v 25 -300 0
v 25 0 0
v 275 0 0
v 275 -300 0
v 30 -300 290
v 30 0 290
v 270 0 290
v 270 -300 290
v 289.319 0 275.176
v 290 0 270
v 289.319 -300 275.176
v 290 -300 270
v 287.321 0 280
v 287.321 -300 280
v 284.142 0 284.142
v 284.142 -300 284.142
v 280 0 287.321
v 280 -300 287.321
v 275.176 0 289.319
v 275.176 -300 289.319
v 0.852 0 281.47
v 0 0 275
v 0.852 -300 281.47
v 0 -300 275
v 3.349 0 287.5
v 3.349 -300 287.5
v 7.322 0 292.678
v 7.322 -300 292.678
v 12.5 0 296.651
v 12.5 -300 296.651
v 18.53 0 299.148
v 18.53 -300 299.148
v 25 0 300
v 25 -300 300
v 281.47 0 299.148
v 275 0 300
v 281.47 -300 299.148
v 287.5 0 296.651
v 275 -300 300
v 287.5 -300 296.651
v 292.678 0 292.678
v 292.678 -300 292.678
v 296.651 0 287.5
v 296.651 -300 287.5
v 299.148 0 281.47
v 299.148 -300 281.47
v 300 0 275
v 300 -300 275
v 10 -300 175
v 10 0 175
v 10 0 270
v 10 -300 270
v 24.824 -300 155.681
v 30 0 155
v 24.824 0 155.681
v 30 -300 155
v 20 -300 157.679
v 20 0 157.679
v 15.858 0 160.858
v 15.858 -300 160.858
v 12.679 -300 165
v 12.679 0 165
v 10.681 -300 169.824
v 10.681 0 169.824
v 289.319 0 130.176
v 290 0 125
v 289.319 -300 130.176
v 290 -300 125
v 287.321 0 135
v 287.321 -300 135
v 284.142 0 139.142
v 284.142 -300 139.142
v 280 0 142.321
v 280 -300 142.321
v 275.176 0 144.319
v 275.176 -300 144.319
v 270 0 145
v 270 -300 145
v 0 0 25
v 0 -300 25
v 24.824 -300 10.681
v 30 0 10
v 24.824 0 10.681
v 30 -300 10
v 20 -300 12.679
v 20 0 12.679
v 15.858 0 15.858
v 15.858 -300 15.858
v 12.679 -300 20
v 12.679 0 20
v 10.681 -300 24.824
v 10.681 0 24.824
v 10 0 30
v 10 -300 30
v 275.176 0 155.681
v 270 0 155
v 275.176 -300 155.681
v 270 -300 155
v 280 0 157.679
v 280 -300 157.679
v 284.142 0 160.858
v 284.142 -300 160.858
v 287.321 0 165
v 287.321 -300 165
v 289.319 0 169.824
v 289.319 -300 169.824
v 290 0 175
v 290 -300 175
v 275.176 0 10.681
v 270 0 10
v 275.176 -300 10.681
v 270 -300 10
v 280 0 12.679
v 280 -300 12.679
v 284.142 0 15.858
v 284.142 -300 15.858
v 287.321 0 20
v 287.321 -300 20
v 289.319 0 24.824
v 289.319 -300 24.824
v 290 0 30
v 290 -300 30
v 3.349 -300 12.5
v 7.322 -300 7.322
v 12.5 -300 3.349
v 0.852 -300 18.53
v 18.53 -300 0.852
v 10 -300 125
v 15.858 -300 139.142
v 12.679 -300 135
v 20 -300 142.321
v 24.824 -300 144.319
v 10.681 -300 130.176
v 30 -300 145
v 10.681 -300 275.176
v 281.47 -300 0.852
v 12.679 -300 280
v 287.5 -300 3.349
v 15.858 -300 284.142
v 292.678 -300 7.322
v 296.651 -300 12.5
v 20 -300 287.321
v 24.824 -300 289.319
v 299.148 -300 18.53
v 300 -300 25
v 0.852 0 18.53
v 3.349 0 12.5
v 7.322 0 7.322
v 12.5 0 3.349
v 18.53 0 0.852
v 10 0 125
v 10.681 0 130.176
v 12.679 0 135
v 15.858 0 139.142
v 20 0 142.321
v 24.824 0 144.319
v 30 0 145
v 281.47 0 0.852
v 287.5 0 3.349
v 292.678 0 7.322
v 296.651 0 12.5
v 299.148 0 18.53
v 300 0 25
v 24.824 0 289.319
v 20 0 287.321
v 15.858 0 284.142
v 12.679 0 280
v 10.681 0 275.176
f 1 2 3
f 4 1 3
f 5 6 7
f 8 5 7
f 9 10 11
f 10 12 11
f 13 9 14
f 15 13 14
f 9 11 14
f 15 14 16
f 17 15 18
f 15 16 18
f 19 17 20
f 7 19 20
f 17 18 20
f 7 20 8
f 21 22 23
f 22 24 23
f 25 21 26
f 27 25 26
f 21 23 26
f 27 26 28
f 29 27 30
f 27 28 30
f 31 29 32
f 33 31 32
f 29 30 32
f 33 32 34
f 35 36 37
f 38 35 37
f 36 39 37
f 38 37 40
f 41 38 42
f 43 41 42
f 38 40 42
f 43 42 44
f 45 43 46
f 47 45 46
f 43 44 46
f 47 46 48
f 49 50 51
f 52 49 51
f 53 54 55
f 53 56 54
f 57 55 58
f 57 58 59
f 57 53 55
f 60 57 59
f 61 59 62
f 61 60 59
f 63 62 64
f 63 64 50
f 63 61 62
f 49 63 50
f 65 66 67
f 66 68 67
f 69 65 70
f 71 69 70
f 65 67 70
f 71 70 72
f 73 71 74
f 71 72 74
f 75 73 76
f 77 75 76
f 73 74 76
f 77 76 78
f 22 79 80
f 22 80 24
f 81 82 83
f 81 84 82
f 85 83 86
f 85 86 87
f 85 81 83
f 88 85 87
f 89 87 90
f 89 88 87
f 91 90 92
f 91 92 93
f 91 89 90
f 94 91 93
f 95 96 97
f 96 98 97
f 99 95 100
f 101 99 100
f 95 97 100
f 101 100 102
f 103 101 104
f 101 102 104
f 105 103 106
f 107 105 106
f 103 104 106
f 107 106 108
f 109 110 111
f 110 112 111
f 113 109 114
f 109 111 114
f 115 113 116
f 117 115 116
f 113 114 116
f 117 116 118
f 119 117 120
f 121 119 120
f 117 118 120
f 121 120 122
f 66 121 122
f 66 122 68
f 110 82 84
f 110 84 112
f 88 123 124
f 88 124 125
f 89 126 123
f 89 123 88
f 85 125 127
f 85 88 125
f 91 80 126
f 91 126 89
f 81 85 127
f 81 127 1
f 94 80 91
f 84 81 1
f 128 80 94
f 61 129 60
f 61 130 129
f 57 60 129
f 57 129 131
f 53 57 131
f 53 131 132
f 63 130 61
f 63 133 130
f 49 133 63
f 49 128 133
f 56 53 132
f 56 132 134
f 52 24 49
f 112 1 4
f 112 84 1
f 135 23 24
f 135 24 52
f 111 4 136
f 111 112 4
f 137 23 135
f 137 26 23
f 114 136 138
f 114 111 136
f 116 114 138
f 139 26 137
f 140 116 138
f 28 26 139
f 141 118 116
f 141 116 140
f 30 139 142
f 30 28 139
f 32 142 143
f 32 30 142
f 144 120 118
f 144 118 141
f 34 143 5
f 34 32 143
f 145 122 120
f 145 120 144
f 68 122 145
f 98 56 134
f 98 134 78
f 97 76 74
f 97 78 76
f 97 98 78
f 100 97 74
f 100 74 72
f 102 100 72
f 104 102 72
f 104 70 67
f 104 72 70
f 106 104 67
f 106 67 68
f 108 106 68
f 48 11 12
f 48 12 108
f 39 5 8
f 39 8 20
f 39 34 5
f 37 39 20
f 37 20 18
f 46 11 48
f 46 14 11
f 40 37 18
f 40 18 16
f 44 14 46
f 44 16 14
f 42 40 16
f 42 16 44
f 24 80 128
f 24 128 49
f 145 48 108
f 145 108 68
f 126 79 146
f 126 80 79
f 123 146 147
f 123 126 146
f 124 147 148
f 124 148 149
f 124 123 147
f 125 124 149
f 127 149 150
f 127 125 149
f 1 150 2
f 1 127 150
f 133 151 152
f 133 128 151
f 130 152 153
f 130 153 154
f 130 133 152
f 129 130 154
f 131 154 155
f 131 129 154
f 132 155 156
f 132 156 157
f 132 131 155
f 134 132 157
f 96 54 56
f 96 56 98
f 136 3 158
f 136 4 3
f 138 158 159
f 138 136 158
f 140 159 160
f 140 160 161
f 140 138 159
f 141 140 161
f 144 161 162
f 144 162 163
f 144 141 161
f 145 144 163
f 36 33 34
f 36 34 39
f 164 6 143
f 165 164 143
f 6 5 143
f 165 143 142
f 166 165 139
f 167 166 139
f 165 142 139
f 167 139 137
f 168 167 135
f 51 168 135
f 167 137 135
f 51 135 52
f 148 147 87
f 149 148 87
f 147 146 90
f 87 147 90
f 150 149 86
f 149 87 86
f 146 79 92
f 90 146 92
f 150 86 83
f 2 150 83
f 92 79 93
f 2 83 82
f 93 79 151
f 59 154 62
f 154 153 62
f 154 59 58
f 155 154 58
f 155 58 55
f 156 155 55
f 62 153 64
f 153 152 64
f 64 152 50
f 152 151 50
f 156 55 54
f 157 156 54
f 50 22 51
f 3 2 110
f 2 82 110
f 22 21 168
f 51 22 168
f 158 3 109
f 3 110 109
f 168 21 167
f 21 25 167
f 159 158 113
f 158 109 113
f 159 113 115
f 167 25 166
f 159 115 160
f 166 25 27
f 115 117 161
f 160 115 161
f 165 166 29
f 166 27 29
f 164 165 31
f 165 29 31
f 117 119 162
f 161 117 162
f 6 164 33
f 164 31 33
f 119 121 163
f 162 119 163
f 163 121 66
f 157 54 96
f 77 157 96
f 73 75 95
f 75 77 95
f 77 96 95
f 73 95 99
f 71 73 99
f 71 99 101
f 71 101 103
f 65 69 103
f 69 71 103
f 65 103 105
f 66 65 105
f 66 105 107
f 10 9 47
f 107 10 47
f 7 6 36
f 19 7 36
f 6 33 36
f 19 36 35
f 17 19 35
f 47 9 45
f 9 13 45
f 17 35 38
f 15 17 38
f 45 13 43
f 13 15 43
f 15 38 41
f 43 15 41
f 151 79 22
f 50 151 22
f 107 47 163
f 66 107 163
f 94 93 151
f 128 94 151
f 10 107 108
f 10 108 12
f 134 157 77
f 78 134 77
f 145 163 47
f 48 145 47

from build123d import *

# Parameters (mm, degrees)
F0_W     = 300
F0_H     = 300
F0_W_2   = 280
F0_H_2   = 135
F1_DEPTH = 300
F2_R     = 20
F3_R     = 25


with BuildPart() as f1:
    # F0 (on Front) → F1 (new body)
    with BuildSketch(Plane.XZ):
        with Locations((150, 150)):
            Rectangle(F0_W, F0_H)
        with Locations((150, 77.5)):
            Rectangle(F0_W_2, F0_H_2, mode=Mode.SUBTRACT)
        with Locations((150, 222.5)):
            Rectangle(F0_W_2, F0_H_2, mode=Mode.SUBTRACT)
    extrude(amount=F1_DEPTH)

    # F2
    f2_edges = [f1.edges().sort_by_distance(p)[0] for p in [
        (10, -150, 290),
        (10, -150, 145),
        (290, -150, 290),
        (290, -150, 145),
        (10, -150, 155),
        (290, -150, 155),
        (290, -150, 10),
        (10, -150, 10),
    ]]
    fillet(f2_edges, radius=F2_R)

    # F3
    f3_edges = [f1.edges().sort_by_distance(p)[0] for p in [
        (0, -150, 300),
        (300, -150, 300),
        (300, -150, 0),
        (0, -150, 0),
    ]]
    fillet(f3_edges, radius=F3_R)


solid = f1.part
